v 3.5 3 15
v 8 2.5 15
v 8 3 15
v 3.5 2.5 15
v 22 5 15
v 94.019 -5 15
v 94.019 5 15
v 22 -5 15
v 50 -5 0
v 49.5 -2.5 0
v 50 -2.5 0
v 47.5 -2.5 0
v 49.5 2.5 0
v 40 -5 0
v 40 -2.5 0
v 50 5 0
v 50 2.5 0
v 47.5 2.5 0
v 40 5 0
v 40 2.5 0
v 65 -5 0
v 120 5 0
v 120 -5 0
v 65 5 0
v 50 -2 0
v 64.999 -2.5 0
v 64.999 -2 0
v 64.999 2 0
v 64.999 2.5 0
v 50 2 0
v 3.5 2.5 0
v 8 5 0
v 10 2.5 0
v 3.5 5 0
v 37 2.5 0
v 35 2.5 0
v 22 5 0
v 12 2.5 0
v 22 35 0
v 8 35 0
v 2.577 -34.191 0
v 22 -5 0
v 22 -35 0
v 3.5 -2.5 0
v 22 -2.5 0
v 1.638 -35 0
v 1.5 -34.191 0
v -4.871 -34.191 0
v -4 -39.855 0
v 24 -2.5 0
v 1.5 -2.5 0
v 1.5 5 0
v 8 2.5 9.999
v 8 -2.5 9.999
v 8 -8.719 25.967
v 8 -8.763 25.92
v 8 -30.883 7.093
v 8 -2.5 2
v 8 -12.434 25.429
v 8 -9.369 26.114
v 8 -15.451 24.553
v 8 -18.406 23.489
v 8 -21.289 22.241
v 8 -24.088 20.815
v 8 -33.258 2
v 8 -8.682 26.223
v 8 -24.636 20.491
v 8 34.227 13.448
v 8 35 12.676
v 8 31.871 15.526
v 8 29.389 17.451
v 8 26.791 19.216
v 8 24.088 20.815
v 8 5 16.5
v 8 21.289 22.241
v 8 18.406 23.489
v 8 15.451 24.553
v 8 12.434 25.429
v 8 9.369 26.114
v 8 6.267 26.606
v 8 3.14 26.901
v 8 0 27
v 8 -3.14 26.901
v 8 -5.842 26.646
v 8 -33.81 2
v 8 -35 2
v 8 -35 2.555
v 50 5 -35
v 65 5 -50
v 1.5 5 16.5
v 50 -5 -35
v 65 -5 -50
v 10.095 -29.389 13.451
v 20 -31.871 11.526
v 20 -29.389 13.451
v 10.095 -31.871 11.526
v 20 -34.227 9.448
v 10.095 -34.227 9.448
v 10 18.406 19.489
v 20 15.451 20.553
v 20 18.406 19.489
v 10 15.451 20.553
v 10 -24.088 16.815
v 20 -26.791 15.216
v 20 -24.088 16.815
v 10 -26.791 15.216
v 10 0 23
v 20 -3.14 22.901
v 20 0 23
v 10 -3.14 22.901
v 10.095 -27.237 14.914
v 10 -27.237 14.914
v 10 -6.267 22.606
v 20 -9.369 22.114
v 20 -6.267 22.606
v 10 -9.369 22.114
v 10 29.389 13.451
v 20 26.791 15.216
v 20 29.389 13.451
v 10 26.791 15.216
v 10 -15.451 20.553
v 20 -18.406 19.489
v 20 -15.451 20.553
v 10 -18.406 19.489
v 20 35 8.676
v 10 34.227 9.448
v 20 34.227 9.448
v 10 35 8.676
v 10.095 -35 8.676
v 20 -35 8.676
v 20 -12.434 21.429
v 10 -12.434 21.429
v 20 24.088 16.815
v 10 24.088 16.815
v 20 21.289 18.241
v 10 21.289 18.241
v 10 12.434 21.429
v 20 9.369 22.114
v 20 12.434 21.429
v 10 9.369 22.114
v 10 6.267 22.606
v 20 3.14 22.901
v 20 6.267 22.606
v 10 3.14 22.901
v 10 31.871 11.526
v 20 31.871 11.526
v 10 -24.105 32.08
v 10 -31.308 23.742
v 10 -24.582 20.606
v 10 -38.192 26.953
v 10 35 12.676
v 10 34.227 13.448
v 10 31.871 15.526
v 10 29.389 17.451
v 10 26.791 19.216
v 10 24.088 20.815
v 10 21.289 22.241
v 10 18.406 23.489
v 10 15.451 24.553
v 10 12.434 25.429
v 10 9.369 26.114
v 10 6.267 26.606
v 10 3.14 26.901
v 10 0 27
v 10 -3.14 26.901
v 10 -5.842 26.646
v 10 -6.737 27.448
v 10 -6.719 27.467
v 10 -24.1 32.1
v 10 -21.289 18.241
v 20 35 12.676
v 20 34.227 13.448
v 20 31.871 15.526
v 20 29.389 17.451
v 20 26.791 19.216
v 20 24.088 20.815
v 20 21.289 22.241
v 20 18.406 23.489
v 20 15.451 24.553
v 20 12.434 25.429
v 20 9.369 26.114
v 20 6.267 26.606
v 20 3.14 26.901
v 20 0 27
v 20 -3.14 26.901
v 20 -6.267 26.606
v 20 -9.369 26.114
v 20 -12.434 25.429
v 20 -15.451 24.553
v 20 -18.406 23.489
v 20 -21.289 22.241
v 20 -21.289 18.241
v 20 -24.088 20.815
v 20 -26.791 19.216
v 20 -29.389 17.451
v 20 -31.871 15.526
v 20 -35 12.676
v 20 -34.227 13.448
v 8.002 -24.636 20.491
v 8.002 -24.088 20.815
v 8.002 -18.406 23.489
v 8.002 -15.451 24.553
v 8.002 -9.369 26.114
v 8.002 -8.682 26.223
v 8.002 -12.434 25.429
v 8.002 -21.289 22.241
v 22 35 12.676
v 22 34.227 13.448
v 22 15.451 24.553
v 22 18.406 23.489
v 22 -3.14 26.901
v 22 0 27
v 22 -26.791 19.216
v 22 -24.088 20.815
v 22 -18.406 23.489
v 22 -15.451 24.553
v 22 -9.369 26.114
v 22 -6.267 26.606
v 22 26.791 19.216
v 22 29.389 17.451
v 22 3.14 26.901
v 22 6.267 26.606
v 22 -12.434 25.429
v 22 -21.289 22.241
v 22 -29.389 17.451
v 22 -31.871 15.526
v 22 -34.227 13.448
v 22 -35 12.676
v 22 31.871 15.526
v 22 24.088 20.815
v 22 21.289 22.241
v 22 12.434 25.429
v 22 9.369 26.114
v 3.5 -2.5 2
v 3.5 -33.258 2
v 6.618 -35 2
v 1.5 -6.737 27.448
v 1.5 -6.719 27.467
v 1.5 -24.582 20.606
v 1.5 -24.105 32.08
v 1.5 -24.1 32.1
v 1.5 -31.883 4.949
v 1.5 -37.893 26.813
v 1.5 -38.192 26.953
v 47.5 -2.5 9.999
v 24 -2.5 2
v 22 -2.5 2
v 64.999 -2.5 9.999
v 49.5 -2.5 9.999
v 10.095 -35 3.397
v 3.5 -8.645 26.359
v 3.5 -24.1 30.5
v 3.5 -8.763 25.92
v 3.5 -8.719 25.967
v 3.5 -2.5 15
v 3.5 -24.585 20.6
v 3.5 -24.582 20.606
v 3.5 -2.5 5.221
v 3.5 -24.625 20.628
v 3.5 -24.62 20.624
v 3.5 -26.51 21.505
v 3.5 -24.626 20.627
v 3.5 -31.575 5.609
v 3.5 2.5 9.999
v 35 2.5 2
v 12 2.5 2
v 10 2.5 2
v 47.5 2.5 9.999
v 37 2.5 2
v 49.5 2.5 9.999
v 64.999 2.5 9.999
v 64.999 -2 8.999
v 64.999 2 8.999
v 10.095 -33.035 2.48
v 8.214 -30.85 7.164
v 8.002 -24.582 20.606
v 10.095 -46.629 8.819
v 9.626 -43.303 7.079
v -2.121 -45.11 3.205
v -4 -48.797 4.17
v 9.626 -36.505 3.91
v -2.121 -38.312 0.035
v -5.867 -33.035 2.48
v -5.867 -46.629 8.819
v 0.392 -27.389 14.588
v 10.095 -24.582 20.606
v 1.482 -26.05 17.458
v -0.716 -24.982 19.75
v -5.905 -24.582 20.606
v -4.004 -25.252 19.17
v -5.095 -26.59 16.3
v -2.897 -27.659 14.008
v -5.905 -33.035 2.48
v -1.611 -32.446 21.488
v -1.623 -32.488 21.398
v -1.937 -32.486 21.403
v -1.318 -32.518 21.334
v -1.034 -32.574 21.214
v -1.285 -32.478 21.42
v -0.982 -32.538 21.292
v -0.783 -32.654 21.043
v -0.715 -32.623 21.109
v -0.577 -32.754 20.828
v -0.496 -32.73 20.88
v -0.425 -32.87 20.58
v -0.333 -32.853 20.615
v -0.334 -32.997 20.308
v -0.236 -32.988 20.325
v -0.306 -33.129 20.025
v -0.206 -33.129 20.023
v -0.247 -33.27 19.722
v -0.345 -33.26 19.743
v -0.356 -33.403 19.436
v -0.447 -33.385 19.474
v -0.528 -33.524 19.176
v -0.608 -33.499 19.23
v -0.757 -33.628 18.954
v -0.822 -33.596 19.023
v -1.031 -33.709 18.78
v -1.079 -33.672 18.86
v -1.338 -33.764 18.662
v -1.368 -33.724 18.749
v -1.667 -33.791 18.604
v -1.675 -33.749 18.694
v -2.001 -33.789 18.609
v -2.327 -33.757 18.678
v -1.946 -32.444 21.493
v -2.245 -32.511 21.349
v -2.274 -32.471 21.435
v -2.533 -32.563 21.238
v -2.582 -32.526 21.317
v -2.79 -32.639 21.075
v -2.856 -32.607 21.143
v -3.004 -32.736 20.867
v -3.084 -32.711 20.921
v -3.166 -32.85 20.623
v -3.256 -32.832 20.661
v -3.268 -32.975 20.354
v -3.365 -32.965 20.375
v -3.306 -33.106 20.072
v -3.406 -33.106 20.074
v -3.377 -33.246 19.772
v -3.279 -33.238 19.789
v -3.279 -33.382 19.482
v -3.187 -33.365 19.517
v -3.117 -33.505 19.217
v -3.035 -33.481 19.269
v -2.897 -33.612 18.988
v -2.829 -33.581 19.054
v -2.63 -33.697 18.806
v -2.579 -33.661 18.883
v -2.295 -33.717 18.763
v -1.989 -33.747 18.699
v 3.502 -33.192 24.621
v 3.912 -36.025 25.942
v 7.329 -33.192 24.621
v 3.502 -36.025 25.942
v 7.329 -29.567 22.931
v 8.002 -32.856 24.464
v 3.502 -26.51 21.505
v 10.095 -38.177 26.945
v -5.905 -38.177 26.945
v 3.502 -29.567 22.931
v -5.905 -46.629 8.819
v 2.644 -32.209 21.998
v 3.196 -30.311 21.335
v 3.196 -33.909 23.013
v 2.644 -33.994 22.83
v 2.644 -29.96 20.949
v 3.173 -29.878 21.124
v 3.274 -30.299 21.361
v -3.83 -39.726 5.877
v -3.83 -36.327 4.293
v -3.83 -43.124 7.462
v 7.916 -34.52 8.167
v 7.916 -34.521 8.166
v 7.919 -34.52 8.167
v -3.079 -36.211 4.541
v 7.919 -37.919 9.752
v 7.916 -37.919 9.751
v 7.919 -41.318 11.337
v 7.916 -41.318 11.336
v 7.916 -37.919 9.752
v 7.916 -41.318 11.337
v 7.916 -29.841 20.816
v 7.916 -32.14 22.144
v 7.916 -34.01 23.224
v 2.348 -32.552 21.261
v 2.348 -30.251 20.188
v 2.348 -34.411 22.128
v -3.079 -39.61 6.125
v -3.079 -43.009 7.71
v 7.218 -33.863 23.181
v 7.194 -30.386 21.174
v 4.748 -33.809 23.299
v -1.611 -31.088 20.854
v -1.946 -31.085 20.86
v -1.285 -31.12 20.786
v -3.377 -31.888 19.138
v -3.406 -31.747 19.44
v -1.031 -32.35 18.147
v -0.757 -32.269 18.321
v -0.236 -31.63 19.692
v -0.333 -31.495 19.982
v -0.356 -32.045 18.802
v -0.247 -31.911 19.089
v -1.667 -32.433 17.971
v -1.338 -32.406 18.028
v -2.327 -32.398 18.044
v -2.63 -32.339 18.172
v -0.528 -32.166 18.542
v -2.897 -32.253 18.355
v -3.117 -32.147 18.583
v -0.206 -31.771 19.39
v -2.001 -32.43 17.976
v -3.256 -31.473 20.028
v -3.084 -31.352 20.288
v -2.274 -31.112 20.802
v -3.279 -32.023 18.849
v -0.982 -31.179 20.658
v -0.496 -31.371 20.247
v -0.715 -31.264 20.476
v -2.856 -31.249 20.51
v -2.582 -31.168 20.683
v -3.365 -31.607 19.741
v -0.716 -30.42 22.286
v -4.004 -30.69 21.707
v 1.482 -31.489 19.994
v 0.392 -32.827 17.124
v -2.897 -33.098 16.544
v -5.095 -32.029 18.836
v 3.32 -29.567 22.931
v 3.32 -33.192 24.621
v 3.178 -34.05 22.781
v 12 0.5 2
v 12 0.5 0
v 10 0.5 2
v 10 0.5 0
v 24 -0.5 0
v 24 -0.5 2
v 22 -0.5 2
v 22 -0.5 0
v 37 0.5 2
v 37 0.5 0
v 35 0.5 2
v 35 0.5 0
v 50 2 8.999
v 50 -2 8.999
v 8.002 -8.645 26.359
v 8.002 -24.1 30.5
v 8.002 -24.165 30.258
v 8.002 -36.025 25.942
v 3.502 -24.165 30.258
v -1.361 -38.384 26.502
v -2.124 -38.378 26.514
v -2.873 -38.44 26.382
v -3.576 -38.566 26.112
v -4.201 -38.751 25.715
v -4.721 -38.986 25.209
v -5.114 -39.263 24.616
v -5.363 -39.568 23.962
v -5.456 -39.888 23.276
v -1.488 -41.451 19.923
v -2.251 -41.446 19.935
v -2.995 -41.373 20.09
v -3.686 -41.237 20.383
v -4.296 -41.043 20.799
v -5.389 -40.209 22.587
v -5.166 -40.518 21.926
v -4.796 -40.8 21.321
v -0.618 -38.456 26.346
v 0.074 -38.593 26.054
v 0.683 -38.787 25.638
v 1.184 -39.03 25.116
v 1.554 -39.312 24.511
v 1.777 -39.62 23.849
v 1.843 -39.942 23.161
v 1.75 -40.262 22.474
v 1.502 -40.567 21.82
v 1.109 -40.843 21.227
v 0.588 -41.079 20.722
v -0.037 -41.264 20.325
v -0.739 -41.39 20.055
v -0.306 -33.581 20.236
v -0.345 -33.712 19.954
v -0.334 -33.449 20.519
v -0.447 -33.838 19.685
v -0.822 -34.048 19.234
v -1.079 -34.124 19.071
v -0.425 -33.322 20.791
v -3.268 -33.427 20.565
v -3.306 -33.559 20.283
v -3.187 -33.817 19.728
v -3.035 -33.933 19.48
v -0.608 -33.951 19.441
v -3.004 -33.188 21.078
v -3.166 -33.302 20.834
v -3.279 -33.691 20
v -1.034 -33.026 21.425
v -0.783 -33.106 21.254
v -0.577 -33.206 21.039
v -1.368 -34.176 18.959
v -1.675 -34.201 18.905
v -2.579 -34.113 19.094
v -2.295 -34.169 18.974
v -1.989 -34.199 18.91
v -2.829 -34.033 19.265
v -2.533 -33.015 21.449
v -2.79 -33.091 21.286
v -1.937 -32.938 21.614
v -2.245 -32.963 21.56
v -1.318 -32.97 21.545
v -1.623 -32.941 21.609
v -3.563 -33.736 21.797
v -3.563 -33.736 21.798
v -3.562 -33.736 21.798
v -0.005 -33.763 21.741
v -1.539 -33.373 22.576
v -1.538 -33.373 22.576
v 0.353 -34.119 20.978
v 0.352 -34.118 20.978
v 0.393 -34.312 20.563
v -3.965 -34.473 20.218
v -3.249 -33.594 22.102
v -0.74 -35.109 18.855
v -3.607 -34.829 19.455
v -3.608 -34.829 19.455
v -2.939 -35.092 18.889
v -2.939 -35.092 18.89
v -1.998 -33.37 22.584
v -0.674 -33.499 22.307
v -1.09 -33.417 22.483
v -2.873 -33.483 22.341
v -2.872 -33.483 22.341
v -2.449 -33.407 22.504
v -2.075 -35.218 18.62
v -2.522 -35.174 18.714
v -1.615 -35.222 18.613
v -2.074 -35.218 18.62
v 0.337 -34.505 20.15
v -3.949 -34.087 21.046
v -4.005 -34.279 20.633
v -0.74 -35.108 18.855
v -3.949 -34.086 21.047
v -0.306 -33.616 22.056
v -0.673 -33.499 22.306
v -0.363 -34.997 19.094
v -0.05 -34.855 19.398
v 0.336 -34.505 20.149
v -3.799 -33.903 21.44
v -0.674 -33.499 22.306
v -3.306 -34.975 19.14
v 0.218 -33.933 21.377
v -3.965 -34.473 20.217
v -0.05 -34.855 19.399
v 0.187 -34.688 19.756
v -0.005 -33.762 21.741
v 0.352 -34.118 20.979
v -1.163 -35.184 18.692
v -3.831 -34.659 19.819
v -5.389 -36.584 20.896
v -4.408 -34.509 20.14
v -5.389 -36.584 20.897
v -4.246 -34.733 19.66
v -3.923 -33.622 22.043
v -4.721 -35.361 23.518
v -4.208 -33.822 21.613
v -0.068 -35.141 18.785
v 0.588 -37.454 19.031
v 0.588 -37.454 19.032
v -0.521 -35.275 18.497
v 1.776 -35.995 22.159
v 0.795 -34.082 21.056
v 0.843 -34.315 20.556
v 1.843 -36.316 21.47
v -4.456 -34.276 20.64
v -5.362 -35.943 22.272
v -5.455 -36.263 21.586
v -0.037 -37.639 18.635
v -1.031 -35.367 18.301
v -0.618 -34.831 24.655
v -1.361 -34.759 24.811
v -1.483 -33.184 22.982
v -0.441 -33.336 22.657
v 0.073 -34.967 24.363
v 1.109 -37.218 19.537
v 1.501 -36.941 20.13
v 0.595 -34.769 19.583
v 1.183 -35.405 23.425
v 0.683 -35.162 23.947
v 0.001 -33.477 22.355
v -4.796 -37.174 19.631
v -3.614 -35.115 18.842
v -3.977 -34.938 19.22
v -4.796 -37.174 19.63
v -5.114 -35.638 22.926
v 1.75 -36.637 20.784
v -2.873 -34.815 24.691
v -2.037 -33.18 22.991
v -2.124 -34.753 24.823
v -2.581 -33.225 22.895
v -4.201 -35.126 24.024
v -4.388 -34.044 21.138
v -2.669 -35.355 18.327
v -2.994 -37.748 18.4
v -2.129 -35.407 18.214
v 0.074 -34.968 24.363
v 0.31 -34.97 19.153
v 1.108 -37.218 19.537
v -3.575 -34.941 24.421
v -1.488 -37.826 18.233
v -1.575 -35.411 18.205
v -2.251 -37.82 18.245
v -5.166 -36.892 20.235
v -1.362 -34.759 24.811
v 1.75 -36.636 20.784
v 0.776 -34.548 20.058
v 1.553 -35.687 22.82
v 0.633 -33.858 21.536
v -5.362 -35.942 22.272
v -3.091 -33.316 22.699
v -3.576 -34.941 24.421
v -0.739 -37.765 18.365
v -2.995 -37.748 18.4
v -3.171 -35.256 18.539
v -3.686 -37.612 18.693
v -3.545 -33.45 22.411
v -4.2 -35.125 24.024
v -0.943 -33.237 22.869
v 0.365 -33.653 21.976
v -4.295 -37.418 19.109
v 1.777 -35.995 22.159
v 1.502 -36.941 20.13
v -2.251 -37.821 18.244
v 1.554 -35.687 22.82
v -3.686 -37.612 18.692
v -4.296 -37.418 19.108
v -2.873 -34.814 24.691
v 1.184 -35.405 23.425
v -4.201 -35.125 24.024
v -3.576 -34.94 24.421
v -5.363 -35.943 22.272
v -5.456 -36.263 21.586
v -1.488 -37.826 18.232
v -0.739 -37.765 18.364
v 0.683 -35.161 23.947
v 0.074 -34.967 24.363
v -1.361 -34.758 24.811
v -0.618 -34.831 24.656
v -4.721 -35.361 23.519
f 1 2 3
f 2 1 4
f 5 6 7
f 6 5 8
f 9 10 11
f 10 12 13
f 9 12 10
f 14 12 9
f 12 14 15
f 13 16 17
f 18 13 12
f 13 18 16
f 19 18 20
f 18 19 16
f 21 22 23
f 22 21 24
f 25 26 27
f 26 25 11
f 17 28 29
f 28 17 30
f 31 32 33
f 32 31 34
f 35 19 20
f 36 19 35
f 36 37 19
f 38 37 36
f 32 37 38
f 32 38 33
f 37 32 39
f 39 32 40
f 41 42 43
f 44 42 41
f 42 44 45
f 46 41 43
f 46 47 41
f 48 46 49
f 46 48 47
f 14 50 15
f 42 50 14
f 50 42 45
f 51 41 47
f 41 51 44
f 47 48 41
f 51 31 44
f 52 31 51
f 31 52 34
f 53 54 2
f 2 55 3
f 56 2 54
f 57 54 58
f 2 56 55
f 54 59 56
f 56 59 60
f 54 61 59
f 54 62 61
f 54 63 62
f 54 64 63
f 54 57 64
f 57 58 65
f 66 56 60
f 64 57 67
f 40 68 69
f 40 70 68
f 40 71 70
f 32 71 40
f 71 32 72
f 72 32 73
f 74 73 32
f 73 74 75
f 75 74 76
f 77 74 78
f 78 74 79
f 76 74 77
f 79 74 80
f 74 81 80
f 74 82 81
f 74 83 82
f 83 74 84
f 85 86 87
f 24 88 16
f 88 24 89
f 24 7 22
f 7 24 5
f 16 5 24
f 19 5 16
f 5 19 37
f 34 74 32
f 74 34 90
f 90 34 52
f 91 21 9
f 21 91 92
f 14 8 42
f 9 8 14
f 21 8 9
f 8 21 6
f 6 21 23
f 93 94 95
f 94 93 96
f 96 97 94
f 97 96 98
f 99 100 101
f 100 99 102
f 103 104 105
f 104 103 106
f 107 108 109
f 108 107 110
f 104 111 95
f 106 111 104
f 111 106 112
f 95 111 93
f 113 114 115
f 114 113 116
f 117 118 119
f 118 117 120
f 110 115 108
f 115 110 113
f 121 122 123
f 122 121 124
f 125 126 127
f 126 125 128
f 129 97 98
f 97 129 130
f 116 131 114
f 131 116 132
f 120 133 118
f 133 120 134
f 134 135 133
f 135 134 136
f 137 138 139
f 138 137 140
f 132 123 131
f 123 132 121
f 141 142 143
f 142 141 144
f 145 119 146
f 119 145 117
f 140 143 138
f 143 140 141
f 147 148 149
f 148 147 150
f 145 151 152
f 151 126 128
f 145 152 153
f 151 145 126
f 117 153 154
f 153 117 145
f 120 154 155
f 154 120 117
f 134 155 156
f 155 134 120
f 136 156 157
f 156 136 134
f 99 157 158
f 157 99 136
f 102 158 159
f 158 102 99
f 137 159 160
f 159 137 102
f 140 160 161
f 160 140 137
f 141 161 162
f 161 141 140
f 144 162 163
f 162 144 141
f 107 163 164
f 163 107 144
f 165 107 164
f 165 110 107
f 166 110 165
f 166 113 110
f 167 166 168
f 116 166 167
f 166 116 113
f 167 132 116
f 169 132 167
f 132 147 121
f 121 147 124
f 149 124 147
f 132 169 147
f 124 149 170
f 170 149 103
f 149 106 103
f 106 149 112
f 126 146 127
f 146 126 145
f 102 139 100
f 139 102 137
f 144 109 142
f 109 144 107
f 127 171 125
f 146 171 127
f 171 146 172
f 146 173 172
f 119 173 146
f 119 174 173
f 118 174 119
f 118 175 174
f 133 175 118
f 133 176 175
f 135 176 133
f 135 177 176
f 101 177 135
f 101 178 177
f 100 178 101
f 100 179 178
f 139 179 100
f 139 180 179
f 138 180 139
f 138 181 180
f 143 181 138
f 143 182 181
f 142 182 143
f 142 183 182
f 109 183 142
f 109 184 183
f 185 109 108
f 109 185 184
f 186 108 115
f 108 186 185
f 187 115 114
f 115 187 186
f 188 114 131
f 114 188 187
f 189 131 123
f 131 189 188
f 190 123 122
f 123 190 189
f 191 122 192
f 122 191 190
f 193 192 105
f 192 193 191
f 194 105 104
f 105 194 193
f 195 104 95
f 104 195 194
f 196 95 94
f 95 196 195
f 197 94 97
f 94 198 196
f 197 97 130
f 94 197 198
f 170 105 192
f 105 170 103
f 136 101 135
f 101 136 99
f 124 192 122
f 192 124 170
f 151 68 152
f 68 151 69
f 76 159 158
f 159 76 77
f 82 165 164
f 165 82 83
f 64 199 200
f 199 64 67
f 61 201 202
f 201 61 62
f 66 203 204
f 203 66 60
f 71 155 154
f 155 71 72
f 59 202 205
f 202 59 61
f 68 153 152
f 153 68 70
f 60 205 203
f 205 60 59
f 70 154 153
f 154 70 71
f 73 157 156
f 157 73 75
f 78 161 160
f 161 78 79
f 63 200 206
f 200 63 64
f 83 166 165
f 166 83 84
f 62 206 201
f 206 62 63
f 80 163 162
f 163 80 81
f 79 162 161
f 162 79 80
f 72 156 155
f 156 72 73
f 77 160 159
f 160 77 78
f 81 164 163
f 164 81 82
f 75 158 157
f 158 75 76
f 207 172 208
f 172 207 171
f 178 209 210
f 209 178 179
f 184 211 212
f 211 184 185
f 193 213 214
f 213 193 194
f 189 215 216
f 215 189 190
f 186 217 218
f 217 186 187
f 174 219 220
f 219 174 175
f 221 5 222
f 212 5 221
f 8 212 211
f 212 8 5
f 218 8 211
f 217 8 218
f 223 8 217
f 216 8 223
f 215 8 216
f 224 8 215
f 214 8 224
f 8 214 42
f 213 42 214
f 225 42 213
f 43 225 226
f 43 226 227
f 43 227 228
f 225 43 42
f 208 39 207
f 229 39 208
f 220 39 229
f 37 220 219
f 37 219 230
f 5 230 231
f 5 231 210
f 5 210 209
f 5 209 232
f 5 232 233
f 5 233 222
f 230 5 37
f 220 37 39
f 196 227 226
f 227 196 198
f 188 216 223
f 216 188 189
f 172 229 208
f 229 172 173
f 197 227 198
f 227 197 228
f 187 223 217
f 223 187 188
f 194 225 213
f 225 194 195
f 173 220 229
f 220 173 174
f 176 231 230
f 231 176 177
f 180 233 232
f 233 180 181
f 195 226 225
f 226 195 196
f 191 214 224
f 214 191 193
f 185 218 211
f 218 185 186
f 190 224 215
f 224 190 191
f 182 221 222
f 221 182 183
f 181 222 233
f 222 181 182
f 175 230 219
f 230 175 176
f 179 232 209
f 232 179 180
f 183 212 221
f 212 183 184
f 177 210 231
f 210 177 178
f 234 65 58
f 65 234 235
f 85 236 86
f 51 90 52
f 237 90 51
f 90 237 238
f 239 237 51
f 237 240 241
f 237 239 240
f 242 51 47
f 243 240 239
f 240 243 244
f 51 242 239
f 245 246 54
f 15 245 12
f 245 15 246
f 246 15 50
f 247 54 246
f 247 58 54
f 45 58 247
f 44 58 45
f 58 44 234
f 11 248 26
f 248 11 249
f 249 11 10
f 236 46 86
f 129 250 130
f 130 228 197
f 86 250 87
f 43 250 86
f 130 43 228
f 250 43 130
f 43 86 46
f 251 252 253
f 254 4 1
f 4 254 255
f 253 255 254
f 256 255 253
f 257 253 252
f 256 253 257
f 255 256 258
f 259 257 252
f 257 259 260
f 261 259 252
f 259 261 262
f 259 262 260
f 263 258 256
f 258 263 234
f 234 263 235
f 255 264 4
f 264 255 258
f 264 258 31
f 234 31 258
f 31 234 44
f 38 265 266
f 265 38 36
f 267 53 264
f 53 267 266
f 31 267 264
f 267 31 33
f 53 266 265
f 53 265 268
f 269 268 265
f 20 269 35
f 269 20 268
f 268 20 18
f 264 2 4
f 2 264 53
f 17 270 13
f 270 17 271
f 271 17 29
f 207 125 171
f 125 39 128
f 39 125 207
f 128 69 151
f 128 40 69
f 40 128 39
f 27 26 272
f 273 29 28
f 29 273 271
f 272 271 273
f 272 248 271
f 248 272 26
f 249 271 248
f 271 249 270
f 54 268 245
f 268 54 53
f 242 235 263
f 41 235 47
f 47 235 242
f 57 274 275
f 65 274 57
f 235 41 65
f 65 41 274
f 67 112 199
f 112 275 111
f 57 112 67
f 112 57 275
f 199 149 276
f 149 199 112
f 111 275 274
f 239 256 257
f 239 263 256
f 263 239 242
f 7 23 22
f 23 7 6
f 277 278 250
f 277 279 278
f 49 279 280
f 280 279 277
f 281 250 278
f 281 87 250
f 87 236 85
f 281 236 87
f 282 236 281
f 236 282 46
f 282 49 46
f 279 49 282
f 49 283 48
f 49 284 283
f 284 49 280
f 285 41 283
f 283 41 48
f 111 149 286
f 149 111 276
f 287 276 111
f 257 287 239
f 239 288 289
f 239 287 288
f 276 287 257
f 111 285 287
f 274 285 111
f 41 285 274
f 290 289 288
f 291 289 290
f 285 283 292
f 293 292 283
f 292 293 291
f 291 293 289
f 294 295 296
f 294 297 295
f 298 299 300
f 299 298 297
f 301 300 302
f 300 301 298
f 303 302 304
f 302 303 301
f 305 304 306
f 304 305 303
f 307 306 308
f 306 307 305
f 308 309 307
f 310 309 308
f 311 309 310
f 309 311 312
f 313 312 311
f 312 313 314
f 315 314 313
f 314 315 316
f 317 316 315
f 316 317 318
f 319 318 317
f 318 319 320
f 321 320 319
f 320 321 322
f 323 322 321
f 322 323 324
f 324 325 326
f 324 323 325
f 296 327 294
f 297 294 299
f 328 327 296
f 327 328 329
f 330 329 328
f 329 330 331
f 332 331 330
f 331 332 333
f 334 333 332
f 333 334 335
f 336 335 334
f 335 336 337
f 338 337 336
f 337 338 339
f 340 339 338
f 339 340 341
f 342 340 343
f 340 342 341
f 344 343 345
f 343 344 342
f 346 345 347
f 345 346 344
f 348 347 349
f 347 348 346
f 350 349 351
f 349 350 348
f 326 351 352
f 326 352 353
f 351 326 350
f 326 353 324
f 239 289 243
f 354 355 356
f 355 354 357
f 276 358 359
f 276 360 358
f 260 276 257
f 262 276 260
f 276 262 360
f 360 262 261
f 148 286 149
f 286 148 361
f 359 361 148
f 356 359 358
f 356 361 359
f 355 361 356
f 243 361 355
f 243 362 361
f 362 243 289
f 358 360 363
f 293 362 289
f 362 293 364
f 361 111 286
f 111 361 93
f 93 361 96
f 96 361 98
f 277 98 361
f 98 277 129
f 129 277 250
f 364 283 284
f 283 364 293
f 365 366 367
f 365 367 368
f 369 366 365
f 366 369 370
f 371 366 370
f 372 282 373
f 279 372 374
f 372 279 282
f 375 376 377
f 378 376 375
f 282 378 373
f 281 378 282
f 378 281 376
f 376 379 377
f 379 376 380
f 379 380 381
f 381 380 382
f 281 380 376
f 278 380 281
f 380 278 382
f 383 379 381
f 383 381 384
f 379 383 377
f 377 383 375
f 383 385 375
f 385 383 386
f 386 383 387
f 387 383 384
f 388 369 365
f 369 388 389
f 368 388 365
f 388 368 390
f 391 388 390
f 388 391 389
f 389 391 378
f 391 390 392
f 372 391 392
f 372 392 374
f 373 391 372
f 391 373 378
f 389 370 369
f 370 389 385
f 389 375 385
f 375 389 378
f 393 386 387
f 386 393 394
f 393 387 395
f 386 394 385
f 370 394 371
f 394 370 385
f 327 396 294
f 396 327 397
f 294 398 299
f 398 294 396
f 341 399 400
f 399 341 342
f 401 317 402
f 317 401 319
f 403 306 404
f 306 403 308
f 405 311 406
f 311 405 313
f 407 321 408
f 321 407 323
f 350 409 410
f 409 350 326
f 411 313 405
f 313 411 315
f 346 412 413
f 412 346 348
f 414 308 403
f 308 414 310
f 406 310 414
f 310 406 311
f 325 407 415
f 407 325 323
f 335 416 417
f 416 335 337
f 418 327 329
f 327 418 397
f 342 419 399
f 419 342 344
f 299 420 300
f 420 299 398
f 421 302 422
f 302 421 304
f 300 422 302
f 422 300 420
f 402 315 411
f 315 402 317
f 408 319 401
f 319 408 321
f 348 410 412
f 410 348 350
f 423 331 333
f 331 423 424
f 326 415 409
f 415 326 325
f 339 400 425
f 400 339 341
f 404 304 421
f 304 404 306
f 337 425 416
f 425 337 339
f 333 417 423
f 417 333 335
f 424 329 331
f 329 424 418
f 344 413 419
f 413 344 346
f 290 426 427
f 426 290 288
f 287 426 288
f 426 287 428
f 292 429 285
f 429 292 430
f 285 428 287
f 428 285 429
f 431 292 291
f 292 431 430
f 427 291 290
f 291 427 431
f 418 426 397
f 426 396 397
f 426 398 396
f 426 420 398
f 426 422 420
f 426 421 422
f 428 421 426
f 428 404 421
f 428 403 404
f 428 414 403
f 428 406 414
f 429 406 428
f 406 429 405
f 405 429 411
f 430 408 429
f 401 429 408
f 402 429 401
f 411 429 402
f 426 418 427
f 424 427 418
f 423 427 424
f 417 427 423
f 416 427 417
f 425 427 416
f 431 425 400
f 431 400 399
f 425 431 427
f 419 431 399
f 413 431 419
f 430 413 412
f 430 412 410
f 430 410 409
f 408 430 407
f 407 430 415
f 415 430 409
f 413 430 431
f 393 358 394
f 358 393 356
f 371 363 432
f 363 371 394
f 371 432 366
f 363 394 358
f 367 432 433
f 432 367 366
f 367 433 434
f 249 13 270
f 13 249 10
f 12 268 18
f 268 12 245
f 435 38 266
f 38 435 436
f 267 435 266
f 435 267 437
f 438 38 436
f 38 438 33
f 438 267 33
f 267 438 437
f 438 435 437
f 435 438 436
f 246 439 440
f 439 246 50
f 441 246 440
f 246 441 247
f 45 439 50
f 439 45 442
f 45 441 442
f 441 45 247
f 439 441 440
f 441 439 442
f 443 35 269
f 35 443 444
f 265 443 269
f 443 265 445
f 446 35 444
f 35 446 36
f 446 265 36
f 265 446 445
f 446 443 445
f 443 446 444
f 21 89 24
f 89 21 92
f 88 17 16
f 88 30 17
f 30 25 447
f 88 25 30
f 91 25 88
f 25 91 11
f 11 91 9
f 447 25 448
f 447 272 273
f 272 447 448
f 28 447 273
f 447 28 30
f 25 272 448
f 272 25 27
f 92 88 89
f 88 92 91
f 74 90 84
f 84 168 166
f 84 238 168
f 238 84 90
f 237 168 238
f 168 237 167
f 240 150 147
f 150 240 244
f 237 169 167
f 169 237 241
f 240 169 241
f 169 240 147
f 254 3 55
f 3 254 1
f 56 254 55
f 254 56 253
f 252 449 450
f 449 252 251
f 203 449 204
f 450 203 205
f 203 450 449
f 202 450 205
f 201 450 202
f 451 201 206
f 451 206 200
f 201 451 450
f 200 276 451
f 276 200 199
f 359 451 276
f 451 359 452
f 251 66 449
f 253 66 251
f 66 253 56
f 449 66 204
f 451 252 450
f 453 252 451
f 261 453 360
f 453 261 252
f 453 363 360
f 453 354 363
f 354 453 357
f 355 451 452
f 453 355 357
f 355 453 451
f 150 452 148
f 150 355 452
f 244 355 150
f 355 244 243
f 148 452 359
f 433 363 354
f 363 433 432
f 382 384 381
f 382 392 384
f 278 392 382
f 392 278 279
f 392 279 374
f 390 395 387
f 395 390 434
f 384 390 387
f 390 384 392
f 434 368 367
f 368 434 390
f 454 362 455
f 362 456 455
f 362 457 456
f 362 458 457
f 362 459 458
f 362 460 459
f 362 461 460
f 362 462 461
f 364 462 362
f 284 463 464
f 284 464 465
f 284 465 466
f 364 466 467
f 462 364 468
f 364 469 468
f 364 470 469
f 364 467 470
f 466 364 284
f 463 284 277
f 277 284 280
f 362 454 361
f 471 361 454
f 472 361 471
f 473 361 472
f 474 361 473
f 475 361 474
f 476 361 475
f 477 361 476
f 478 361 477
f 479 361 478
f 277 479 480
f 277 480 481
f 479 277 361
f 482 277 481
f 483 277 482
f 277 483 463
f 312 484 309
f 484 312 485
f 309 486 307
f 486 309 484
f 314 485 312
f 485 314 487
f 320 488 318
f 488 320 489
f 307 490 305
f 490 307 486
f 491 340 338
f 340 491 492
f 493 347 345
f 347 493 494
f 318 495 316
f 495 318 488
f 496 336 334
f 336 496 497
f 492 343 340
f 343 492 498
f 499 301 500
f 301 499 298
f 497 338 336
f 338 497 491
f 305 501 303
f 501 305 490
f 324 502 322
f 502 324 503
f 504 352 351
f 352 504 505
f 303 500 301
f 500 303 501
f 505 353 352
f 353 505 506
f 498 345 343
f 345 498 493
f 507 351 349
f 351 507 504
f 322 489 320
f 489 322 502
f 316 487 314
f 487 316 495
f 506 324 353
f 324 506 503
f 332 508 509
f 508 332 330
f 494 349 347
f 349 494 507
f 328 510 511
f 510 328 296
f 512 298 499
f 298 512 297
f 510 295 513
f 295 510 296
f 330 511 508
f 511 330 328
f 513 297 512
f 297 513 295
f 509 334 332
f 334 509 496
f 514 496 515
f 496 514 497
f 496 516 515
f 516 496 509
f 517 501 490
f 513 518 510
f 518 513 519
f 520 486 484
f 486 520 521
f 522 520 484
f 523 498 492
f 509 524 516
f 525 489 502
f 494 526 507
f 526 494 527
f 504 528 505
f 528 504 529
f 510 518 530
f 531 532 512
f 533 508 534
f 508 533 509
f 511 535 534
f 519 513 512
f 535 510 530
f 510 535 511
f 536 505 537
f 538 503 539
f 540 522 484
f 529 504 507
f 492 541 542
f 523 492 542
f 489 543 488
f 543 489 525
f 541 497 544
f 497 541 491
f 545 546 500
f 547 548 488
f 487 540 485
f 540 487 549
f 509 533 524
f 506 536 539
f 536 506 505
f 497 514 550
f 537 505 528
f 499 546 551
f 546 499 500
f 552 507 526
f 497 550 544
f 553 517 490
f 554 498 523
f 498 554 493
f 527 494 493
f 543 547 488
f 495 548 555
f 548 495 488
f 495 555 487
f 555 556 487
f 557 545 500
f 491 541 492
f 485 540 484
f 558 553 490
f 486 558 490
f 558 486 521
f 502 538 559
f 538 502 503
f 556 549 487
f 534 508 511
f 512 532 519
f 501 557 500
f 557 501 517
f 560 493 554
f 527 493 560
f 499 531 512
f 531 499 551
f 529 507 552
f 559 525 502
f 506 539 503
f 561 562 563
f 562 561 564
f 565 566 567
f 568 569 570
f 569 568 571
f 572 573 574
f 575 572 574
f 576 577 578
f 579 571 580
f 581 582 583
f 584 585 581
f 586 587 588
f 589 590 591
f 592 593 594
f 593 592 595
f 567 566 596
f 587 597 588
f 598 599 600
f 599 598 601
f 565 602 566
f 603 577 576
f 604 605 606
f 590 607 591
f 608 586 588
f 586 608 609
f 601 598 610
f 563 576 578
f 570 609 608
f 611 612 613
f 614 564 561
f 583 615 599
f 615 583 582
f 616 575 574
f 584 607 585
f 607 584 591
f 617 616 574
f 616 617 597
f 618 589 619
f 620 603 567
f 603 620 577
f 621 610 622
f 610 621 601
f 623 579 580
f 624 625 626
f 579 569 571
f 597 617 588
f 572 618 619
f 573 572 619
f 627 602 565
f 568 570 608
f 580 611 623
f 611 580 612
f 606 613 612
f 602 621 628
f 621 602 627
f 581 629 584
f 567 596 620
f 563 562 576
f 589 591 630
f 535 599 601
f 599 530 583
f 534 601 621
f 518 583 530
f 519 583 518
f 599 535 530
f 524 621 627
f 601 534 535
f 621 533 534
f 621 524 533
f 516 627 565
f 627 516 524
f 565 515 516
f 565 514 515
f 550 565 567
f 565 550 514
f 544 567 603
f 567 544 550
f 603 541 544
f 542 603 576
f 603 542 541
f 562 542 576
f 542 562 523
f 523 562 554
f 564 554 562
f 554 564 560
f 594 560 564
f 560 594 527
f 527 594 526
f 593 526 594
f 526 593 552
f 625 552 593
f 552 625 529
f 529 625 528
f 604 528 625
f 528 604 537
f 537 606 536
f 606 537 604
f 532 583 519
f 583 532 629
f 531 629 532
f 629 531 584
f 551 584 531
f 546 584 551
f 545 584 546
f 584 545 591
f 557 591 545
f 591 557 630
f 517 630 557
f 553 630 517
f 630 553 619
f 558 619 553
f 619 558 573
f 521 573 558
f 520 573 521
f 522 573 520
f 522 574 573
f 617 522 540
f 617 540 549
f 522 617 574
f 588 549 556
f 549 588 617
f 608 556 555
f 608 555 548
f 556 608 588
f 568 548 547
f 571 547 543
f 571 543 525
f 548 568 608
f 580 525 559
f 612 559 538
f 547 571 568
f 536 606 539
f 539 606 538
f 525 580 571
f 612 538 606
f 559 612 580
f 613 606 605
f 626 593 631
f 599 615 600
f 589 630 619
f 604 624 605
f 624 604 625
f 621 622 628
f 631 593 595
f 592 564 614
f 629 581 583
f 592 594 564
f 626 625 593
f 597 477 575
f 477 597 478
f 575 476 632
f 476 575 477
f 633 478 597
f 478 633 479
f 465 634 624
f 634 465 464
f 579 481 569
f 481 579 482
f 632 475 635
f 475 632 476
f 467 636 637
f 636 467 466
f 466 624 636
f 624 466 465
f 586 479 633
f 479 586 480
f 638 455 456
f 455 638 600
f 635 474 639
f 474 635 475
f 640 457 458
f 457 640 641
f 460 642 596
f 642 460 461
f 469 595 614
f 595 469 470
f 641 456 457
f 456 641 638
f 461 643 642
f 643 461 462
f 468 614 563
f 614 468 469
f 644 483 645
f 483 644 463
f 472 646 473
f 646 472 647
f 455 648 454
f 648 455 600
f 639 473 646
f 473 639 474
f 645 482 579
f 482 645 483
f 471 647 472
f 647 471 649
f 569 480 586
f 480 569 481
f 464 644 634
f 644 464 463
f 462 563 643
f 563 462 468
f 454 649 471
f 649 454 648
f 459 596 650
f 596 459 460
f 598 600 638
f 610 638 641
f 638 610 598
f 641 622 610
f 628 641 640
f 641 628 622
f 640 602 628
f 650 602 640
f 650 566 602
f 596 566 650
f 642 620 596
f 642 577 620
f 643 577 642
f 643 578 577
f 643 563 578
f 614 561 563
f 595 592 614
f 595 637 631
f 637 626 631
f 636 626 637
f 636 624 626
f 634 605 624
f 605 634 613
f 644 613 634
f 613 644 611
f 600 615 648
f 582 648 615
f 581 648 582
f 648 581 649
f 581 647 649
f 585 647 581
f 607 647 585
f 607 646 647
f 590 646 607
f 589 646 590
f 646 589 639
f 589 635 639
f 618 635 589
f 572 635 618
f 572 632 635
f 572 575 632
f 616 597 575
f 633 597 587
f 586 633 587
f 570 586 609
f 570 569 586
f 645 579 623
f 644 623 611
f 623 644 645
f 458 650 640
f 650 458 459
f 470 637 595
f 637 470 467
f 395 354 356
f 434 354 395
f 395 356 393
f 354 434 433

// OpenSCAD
//
// ktRACK16
//

gap1 = 0.001;
gap2 = 0.002;
th = 2;



arm_a();
arm_b();
arm_c();



module arm_a ()
{
difference()
{
    union()
    {
        translate([8, -10/2, 0]) cube([120-8, 10, 15]);
        translate([10, 0, -27]) rotate([0, 90, 0]) cylinder(10, 50, 50, $fn=100);
        translate([10-2, 0, -27+4]) rotate([0, 90, 0]) cylinder(2, 50, 50, $fn=100);
        translate([20, 0, -27+4]) rotate([0, 90, 0]) cylinder(2, 50, 50, $fn=100);
        translate([1.5, -32.5-2.5, 0]) cube([8.5, 32.5, 2]);
        translate([1.5, 5, -gap1]) rotate([180-34.85, 0, 0]) cube([2, 36.1, 25]);
        translate([1.5+2, 2.5, 0]) cube([6.5+gap2, 2.5, 15]);
    }
    
    translate([0, -110, -200]) cube([40, 220, 200]);
    translate([0, 35, -10]) cube([40, 100, 40]);
    translate([0, -35-100, -10]) cube([40, 100, 40]);
    
    translate([8-gap1, -5/2, 0-gap1]) cube([65-8, 5, 10]);
    translate([1.5-gap1, -2.5, -gap1]) cube([6.5+gap2, 5, 10]);
    translate([1.5-gap1, -2.5, -gap1]) cube([2, 7.5, 10]);
    
    translate([-4, -42, 1]) rotate([-25, 0, 0]) rotate([0, -20, 0]) cube([15, 7.5, 5.5]);
    translate([-4, -42, 1]) rotate([-25, 0, 0]) rotate([0, -20, 0]) translate([15, 7.5, 0]) rotate([0, -20, 180]) cube([16, 17.5, 20]);
    
    translate([120, 10, 0]) rotate([0, -30, 180]) cube([50, 20, 20]);
}
difference()
{
    translate([-4, -42, 1]) rotate([-25, 0, 0]) rotate([0, -20, 0])dock_a();

    translate([-30, -100, -200]) cube([200, 200, 200]);
}
translate([50-2-0.5, -10/2, 0]) cube([2, 10, 15]);
translate([10, -10/2+2.5+3, 0]) cube([2, 2, 2]);
translate([22, -10/2+2.5, 0]) cube([2, 2, 2]);
translate([35, -10/2+2.5+3, 0]) cube([2, 2, 2]);
}



module arm_b ()
{
difference()
{
    union()
    {
        translate([50, -10/2, -50]) cube([15, 10, 50]);
        translate([50, -4/2, 0-gap1]) cube([15, 4, 9]);
    }
    translate([65, 10, -50]) rotate([0, 90-45, 180]) cube([20, 20, 50]);
}
}



module arm_c ()
{
difference()
{
    union()
    {
        translate([1.5, 5, 15+1.5]) rotate([180-43.1, 0, 0]) cube([8.5, 16.05, 15]);
        translate([1.5, 5, 15+1.5]) rotate([180-0, 0, 0]) cube([8.5, 19.1, 16.5]);
        translate([8.5+1.5, -38.2, 26.95]) rotate([180-20, 0, 180]) cube([8.5, 15, 15]);
        translate([8.5+1.5, -24.1, 32.1]) rotate([180+15, 0, 180]) cube([8.5, 18, 18]);
    }
    
    translate([10-2+gap1, 0, -27+4]) rotate([0, 90, 0]) cylinder(2, 50, 50, $fn=100);
    translate([1.5+2, 3-35+2+gap1, -gap1]) cube([4.5+gap2, 35, 15]);
    translate([1.5+2, 5-2, 15+1.5-1.5]) rotate([180-43.1, 0, 0]) cube([4.5+gap2, 16.05, 15]);
    translate([4.5+1.5+2+gap2, -24.1, 32.1-1.6]) rotate([180+15, 0, 180]) cube([4.5+gap2, 16, 18]);
    translate([4.5+1.5+2+gap2, -38.2, 26.95-1.8]) rotate([180-20, 0, 180]) cube([4.5, 15, 15]);
    translate([1.5-gap1, 5, -gap1]) rotate([180-34.85, 0, 0]) cube([2+gap2, 36.1, 25]);
    translate([-4, -42, 1]) rotate([-25, 0, 0]) rotate([0, -20, 0]) translate([15, 7.5, 0]) rotate([0, -20, 180]) cube([16, 17.5, 20]);
    
}
translate([-4, -42, 1]) rotate([-25, 0, 0]) rotate([0, -20, 0])dock_b();
translate([1.5, -2.5, 0]) cube([2, 7.5, 15]);
}



module dock_a ()
{
difference()
{
    union()
    {
        translate([0, 0, 0]) cube([15, 7.5, 5.5]);
        translate([15, 7.5, 0]) rotate([0, -20, 180]) cube([16, 7.5, 20]);
    }
    
    translate([2, 0, -gap1]) conn();
    translate([8.3, -2, 5]) rotate([0, 24, 0]) cube([4, 4, 30]);
    translate([8.3, -2, 24]) rotate([0, 20, 0]) cube([7, 4, 35]);
    translate([8.3, -2, 24]) rotate([0, 20, 0]) cube([13, 4, 20]);
    translate([25, -2, 51.5]) rotate([0, 20, 0]) cube([53, 4, 10]);
    translate([73.7, -2, 42]) rotate([0, 20, 0]) cube([4, 10, 5]);
    
    translate([9.25, -gap1, 19]) rotate([-90, 9, 0]) screw_hole();

}
}



module dock_b ()
{
difference()
{
    union()
    {
        translate([0, -7.5, 0]) cube([15, 7.5, 5.5]);
        translate([15, 0, 0]) rotate([0, -20, 180]) cube([16, 7.5, 20]);
    }
    
    translate([2, 0, -gap1]) conn();
    translate([8.3, -2, 5]) rotate([0, 24, 0]) cube([4, 4, 30]);
    translate([8.3, -2, 24]) rotate([0, 20, 0]) cube([7, 4, 35]);
    translate([8.3, -2, 24]) rotate([0, 20, 0]) cube([13, 4, 20]);
    translate([25, -2, 51.5]) rotate([0, 20, 0]) cube([53, 4, 10]);
    translate([73.7, -2, 42]) rotate([0, 20, 0]) cube([4, 10, 5]);
    
    translate([9.25, -3.5, 19]) rotate([-90, 9, 0]) rear_screw_hole();

}
}



module conn ()
{
translate([0, -7.5/2, 0])
difference()
{
    translate([0, 0, 0]) cube( [18, 7.5, 19.5]);
    
    translate([12.5, -1, -gap1]) cube([10, 10, 5]);
    translate([12.5, -1, 5]) rotate([0, 20, 0]) cube([10, 10, 20]);
    translate([0, 10-1, 5]) rotate([0, -40, 180]) cube([10, 10, 20]);
    translate([0.8, 10-1, 5]) rotate([0, -38, 180]) cube([10, 10, 20]);
    translate([-9.2, -1, 5]) cube([10, 10, 10]);
    translate([20, 0, 5]) rotate([7, 0, 180]) cube([20, 10, 20]);
    translate([0, 7.5, 5]) rotate([5, 0, 0]) cube([20, 10, 20]);
    translate([18, 10-1, 17]) rotate([5, -23, 180]) cube([10, 10, 20]);
}
}



module screw_hole()
{
    cylinder( 10, 1.6, 1.6, $fn=30 );
    translate( [0, 0, 1.5] ) cylinder( 10, 6.5/2+0.1, 6.5/2+0.1, $fn=6 );
}



module rear_screw_hole()
{
    translate([0, 0, 3]) cylinder(5, 1.5, 1.5, $fn=30);
    translate([0, 0, 2.2-gap1]) cylinder(0.8+gap2, 1.5+0.7, 1.5, $fn=30);
    translate([0, 0, -gap1]) cylinder(2.2+gap1, 3.25+0.4, 3.25-0.6, $fn=30);
    translate([0, 0, -10]) cylinder(10, 3.25+0.4, 3.25+0.4, $fn=30);
}
